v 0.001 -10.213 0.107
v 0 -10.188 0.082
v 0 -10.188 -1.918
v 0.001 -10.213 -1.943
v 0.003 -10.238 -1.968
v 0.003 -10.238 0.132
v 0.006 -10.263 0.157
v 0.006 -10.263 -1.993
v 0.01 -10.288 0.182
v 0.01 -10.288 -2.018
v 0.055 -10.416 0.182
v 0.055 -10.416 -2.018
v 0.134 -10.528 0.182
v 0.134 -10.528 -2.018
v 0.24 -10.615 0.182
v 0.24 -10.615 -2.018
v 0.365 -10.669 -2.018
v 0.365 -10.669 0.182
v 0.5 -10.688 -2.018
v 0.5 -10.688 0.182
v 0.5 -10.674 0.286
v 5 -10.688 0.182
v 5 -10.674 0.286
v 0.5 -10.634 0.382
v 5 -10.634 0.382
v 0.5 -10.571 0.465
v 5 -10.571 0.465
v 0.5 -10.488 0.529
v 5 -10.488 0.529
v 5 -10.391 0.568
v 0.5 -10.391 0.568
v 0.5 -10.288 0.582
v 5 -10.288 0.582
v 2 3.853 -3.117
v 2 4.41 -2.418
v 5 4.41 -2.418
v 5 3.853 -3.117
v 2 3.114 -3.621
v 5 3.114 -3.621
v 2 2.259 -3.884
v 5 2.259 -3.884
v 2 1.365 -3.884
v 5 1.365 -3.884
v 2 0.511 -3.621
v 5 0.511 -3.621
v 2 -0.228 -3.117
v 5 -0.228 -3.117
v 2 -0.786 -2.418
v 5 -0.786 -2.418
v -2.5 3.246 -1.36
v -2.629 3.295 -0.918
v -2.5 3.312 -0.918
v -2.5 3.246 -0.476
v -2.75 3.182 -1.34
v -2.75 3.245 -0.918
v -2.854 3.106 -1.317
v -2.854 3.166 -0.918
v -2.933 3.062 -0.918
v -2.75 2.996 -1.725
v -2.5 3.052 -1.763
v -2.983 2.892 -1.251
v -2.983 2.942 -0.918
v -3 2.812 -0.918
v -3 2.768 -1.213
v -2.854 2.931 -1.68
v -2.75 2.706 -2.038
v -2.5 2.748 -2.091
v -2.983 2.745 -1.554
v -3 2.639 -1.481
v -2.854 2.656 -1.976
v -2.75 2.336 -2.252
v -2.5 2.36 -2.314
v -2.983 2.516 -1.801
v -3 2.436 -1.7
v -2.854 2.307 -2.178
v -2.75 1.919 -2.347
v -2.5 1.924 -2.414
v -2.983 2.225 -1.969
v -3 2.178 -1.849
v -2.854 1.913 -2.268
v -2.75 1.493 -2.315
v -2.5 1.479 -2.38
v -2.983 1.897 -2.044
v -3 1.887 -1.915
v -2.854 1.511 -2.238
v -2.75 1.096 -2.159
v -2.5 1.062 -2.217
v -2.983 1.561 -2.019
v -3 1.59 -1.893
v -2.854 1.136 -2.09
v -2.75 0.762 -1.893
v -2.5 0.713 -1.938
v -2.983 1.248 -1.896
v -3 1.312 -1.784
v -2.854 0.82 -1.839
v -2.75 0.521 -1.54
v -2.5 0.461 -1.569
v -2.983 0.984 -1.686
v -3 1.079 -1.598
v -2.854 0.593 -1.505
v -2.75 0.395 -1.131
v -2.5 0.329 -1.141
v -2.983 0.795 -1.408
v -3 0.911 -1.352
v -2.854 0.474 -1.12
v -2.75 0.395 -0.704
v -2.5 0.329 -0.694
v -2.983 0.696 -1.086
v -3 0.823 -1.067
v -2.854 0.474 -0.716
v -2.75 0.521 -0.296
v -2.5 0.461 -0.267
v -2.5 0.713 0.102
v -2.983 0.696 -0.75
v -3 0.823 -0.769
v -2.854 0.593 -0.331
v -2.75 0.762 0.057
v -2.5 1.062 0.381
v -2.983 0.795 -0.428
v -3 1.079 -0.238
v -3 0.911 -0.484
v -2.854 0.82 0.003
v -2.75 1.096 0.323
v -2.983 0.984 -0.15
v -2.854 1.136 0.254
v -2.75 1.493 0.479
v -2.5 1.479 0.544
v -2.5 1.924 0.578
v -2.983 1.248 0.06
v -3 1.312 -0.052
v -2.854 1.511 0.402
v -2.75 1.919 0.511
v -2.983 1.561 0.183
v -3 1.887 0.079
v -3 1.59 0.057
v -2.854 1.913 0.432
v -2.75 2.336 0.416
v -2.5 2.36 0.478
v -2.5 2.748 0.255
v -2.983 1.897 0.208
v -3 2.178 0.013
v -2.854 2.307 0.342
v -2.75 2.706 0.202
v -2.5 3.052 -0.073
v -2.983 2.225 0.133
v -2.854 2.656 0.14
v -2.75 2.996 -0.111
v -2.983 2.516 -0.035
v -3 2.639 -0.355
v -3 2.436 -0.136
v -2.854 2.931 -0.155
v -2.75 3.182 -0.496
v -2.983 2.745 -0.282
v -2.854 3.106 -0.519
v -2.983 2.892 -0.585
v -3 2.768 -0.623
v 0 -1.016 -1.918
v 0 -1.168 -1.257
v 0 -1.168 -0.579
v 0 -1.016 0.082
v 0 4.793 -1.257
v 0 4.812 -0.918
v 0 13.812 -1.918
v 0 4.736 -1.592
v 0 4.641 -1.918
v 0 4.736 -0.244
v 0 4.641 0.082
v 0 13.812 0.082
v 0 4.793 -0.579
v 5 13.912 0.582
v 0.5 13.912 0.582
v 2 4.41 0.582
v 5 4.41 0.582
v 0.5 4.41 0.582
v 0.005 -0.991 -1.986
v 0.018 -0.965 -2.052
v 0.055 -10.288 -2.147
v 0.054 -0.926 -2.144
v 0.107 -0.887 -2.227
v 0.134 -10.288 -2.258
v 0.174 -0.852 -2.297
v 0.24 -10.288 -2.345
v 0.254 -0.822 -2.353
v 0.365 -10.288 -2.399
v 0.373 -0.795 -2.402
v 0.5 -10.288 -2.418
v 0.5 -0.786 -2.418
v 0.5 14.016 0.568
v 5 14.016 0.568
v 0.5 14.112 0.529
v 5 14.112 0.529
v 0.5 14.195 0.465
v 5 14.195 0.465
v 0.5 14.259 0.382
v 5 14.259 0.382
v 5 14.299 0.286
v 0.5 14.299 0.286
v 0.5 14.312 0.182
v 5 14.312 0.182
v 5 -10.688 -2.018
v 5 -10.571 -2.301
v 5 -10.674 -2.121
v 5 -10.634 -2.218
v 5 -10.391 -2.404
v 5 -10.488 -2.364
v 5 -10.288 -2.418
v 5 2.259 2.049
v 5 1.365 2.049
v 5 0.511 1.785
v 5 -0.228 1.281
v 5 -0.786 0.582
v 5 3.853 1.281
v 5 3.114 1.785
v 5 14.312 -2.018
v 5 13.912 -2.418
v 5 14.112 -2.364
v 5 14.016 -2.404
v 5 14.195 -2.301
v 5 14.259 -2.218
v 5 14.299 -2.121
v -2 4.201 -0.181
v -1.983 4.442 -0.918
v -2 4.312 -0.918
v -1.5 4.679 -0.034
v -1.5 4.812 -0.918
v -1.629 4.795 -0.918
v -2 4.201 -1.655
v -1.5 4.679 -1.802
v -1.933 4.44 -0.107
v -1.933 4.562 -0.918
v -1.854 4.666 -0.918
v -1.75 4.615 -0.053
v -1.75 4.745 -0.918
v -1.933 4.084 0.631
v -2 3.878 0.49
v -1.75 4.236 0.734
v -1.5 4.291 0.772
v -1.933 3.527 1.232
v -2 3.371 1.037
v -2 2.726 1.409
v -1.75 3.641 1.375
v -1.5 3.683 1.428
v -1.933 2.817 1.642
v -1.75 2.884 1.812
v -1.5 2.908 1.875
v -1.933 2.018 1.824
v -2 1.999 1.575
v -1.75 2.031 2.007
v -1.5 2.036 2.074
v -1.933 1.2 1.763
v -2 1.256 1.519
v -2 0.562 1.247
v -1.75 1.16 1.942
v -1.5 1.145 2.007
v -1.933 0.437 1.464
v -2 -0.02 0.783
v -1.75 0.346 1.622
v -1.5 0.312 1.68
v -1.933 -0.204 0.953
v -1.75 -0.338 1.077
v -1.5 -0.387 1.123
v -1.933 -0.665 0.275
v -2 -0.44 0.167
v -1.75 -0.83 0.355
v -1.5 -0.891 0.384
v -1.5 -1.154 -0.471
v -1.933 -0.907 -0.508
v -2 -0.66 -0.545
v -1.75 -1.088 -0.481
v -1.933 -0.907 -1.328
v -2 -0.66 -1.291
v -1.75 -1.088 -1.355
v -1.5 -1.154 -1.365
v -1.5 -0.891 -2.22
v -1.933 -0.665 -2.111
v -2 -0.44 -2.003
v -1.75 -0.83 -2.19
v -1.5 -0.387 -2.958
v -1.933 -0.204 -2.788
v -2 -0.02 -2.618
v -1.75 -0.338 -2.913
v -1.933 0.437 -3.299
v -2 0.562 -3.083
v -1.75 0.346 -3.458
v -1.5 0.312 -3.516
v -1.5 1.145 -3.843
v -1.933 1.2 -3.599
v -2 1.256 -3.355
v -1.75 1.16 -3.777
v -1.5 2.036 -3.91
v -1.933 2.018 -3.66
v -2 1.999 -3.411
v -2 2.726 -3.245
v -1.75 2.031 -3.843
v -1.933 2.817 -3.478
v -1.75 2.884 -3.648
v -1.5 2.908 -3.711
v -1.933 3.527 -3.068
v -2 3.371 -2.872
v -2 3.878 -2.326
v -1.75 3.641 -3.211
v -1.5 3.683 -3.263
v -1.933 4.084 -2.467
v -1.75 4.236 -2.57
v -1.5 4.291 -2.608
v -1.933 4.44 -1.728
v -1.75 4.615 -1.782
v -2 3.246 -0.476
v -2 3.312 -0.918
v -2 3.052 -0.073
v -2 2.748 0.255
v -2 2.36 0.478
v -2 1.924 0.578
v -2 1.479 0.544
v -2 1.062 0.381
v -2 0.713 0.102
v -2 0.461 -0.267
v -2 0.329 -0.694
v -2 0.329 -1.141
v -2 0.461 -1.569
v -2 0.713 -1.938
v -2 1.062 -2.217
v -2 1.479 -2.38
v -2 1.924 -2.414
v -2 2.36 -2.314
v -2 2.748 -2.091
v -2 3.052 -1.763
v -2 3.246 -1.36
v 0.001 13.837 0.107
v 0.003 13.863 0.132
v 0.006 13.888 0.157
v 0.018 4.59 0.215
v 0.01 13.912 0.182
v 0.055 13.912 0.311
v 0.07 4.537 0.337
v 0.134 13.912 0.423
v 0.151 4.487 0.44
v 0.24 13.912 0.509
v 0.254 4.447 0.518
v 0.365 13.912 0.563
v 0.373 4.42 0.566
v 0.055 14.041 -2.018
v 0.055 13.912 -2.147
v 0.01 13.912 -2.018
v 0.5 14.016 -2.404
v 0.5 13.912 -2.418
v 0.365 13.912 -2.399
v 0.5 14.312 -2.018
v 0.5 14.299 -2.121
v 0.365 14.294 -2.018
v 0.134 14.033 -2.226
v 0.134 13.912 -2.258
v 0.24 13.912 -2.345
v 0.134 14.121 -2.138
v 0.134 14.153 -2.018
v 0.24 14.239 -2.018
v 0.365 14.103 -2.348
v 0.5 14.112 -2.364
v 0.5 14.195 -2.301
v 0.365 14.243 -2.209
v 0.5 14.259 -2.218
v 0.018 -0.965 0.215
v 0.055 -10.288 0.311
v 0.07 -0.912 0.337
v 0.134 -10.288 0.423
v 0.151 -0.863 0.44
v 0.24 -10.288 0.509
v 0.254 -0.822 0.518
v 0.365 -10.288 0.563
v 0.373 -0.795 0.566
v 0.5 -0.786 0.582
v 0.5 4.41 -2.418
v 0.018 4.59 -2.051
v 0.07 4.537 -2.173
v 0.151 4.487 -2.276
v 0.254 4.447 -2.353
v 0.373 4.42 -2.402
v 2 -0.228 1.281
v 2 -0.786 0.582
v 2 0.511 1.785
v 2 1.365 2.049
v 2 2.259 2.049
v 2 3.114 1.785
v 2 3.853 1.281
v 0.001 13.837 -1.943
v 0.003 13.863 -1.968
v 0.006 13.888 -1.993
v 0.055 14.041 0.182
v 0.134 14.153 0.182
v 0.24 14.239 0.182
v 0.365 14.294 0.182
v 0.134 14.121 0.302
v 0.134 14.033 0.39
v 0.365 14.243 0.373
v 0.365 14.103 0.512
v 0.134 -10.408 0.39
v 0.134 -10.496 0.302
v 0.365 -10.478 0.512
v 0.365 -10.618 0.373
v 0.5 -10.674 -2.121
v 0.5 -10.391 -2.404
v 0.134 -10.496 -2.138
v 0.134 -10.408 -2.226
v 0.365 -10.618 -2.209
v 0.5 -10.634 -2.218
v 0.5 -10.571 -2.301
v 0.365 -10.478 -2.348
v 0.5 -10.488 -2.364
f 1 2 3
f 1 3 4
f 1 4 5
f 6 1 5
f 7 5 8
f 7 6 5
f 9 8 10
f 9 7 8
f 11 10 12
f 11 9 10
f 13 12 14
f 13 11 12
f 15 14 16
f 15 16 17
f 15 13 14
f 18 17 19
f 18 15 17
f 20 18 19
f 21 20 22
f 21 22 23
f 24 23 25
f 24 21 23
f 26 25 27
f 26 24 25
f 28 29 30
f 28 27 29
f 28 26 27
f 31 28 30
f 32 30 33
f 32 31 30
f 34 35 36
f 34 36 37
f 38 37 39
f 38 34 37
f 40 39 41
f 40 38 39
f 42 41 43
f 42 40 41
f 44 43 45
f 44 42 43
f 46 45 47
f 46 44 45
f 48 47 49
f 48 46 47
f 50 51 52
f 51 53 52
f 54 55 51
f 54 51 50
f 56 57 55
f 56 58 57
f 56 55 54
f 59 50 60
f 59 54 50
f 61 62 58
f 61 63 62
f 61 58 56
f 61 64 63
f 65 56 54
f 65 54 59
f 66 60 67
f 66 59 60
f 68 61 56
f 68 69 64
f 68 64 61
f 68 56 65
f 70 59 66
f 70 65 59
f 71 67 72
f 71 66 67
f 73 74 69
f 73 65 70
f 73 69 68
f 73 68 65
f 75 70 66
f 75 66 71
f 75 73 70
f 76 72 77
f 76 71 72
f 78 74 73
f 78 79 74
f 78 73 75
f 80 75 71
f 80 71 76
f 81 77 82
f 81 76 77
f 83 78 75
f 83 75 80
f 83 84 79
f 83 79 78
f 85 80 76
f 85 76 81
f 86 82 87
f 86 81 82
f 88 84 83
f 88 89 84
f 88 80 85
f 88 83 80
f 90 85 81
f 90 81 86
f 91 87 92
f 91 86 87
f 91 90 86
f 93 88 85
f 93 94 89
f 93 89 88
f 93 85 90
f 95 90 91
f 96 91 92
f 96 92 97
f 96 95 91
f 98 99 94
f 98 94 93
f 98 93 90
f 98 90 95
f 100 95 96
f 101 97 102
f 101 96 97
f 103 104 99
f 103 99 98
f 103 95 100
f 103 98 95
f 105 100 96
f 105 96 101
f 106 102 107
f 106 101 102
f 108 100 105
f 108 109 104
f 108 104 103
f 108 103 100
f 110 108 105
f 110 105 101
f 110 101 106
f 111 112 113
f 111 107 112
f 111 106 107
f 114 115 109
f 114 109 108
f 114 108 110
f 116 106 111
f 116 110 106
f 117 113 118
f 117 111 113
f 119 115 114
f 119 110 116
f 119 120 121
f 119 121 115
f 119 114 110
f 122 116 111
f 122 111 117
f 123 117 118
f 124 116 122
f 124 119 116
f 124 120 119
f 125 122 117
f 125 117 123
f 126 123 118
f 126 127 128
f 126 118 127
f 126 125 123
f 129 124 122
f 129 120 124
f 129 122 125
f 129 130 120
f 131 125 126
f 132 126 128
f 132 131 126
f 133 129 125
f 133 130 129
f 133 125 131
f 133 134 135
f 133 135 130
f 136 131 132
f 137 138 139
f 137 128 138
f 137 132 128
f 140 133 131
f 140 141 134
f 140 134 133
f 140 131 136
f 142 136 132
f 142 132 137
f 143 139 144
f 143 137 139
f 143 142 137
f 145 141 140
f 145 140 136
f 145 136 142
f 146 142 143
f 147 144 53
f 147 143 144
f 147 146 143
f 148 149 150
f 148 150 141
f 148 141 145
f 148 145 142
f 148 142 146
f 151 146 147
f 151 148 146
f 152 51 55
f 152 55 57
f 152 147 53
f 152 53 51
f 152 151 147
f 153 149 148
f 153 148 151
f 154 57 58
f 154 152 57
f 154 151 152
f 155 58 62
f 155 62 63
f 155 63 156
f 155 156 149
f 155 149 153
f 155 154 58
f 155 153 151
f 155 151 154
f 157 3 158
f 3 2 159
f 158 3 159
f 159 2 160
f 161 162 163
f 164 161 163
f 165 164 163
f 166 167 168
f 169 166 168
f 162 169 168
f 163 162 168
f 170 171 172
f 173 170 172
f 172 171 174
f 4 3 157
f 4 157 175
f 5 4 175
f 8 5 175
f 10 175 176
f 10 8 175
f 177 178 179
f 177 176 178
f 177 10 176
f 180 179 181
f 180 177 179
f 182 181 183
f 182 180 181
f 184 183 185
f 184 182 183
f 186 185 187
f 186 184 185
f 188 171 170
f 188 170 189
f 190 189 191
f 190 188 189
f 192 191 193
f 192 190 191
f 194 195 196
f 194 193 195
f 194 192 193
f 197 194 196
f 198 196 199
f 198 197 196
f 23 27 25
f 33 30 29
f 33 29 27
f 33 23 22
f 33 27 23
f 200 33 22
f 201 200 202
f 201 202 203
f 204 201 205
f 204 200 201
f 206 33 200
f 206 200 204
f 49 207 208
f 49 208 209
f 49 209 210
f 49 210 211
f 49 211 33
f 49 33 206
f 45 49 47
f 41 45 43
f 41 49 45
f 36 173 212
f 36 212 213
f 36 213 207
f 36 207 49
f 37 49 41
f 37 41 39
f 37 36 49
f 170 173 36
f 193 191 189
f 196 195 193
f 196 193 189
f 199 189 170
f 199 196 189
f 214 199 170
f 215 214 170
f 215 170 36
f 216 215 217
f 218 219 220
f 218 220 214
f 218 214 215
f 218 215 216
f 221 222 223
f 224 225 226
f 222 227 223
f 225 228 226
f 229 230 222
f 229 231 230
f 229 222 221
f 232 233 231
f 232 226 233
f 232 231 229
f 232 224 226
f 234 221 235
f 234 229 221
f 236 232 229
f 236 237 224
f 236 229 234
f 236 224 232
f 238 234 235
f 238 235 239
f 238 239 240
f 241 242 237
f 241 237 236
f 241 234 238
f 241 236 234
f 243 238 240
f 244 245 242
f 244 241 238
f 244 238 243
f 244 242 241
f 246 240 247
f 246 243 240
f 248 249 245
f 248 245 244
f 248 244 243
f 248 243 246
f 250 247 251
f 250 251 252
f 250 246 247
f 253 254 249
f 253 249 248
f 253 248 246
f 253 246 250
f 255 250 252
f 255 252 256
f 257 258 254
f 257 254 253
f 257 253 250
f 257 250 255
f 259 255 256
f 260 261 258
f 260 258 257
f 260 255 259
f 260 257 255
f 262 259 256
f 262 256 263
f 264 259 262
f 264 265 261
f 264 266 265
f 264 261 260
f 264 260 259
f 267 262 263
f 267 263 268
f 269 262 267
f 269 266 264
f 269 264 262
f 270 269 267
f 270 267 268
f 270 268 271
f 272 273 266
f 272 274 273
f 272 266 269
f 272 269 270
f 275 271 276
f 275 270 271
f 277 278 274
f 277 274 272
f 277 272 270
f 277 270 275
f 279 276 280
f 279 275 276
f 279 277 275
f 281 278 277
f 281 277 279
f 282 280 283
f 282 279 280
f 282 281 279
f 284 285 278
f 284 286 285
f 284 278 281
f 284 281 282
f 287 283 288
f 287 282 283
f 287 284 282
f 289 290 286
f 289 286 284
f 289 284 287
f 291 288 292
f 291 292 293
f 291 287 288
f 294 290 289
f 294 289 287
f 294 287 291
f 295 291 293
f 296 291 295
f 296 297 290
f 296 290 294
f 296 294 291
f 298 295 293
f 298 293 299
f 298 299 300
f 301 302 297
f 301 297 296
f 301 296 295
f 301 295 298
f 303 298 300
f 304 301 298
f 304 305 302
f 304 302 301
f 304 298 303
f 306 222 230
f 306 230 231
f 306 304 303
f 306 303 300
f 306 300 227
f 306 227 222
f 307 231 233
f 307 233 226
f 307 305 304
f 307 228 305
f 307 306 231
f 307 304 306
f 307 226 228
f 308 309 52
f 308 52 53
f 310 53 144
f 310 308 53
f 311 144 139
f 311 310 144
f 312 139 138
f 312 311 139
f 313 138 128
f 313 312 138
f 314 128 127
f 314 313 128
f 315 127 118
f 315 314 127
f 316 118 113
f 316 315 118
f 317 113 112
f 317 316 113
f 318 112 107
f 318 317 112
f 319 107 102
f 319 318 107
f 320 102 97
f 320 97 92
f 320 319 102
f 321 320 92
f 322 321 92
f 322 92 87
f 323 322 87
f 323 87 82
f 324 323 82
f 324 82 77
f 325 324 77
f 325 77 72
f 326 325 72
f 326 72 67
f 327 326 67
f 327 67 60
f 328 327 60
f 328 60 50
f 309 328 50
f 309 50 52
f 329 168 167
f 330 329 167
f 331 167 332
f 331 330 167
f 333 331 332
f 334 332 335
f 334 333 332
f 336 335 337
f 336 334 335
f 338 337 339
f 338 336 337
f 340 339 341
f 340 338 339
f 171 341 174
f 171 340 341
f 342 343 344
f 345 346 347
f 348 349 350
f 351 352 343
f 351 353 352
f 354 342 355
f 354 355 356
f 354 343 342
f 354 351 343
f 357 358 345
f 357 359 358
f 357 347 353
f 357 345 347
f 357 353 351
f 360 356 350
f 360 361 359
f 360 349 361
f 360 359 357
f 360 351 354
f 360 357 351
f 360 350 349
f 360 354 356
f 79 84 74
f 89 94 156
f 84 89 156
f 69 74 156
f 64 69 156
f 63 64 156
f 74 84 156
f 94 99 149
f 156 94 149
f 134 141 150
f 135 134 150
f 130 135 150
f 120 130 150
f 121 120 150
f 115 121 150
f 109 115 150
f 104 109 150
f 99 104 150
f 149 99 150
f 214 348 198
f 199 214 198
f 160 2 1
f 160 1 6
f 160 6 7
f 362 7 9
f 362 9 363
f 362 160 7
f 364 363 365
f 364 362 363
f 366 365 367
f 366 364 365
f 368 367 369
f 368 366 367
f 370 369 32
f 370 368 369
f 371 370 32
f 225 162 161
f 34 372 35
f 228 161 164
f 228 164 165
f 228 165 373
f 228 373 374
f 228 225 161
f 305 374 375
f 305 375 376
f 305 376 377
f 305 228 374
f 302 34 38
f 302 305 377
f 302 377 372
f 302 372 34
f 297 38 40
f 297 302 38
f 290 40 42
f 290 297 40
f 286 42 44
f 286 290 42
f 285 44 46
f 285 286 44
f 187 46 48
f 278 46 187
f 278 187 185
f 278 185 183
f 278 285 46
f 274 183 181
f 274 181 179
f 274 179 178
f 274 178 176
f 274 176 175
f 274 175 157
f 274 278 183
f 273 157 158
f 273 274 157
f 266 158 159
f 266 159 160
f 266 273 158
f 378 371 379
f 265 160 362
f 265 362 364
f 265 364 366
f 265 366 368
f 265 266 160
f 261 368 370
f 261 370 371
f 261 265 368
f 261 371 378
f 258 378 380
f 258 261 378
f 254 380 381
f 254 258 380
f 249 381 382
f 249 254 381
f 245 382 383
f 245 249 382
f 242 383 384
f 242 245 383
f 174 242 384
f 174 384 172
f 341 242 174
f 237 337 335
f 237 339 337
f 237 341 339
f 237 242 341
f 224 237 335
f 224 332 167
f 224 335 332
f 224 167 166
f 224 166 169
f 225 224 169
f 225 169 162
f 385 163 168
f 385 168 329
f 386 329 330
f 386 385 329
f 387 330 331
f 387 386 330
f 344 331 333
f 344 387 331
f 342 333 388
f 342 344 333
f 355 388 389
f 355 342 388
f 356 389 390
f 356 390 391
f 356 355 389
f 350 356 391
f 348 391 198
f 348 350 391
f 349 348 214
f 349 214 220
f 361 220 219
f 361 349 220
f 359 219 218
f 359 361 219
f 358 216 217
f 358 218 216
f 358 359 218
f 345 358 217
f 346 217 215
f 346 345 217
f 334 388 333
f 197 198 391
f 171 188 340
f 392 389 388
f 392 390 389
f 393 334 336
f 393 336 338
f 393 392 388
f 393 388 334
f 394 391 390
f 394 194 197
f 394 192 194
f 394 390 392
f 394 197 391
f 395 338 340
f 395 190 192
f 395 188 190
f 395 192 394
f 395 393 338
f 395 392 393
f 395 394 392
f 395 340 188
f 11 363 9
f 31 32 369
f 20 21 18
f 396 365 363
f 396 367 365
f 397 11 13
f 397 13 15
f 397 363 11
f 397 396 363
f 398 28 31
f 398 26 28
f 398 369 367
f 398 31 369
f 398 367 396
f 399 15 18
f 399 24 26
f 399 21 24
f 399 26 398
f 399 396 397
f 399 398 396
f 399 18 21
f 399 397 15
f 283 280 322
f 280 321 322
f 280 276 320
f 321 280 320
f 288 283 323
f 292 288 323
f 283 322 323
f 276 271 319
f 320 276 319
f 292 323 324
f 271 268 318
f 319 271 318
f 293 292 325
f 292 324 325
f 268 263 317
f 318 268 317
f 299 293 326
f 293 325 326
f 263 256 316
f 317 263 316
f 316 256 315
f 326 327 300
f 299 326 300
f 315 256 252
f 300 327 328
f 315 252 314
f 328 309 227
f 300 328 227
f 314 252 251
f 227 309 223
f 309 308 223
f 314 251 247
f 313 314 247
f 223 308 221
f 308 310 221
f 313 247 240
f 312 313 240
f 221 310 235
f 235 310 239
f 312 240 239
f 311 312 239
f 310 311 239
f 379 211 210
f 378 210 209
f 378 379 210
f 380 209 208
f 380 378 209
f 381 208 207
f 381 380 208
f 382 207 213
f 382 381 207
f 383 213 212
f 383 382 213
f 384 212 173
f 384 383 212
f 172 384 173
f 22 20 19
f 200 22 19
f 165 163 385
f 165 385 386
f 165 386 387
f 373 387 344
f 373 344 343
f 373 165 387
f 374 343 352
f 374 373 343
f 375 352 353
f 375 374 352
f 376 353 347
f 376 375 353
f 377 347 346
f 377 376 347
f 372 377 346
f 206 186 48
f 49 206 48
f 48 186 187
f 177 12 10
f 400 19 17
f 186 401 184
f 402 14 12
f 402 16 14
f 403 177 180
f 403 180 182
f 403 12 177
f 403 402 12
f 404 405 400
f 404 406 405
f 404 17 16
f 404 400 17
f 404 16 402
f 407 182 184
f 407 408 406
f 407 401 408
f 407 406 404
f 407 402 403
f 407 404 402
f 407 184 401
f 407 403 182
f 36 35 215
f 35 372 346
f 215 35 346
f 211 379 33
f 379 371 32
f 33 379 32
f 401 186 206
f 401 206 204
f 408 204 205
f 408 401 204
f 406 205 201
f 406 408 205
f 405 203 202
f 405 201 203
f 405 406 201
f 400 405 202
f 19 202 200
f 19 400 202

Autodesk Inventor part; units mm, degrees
ref_plane "YZ Plane" through (0, 0, 0) normal (1, 0, 0) x (0, 1, 0)
ref_plane "XZ Plane" through (0, 0, 0) normal (0, 1, 0) x (-1, 0, 0)
ref_plane "XY Plane" through (0, 0, 0) normal (0, 0, 1) x (1, 0, 0)
sketch "Sketch1" plane through (0, 0, 0) normal (1, 0, 0) x (0, 1, 0)
  line L0 (13.9123, 0.5821) -> (-10.2877, 0.5821)
  line L1 (-10.6877, 0.1821) -> (-10.6877, -2.0179)
  line L2 (-10.2877, -2.4179) -> (13.9123, -2.4179)
  line L3 (14.3123, -2.0179) -> (14.3123, 0.1821)
  arc A0 (13.9123, -2.4179) -> (14.3123, -2.0179) centre (13.9123, -2.0179) ccw
  arc A1 (14.3123, 0.1821) -> (13.9123, 0.5821) centre (13.9123, 0.1821) ccw
  arc A2 (-10.6877, -2.0179) -> (-10.2877, -2.4179) centre (-10.2877, -2.0179) ccw
  arc A3 (-10.2877, 0.5821) -> (-10.6877, 0.1821) centre (-10.2877, 0.1821) ccw
  line L4 (14.3123, -4.8123) -> (1.8123, -4.8123) construction
  line L5 (14.3123, 0.1821) -> (14.3123, -23.1695) construction
  circle A4 centre (1.8123, -0.9179) radius 3
  circle A5 centre (1.8123, -0.9179) radius 1.5
  point P0 (0, 0)
  point P1 (-10.6877, -2.4179)
  point P2 (-10.6877, 0.5821)
  point P3 (14.3123, -2.4179)
  point P4 (4.4103, 0.5821)
  point P5 (-0.7858, 0.5821)
  point P6 (-0.7858, -2.4179)
  point P7 (4.4103, -2.4179)
  dimension "d1" = 3
  dimension "d2" = 25
  dimension "d3" = 0.4
  dimension "d4" = 12.5
  dimension "d5" = 6
extrude "Extrusion1" add sketch "Sketch1" along normal blind 2
extrude "Extrusion2" add sketch "Sketch1" against normal blind 2 contours A4 L2 A5 L0 | L0 A4 | A5 L2 A4 L0 | A5 | L2 A4
extrude "Extrusion3" add sketch "Sketch1" against normal blind 3 contours A5
fillet "Fillet1" radius 0.5 1 edges at (-3, 0.3123, -0.9179)
fillet "Fillet2" radius 0.5 1 edges at (-2, -1.1877, -0.9179)
fillet "Fillet3" radius 0.5 10 edges at (0, 14.1951, 0.465) (0, 14.3123, -0.9179) (0, 14.1951, -2.3007) (0, 9.1613, -2.4179) (0, 9.1613, 0.5821) (0, -10.5706, 0.465) (0, -10.6877, -0.9179) (0, -10.5706, -2.3007) (0, -5.5368, -2.4179) (0, -5.5368, 0.5821)
sketch "Sketch2" plane through (2, 0, 0) normal (1, 0, 0) x (0, 0, -1)
  line L0 (-0.5821, 13.9123) -> (-0.5821, 4.4103) projected
  arc A0 (-0.5821, 4.4103) -> (-0.5821, -0.7858) centre (0.9179, 1.8123) ccw projected
  line L1 (-0.5821, -0.7858) -> (-0.5821, -10.2877) projected
  arc A1 (-0.5821, -10.2877) -> (-0.1821, -10.6877) centre (-0.1821, -10.2877) ccw projected
  line L2 (-0.1821, -10.6877) -> (2.0179, -10.6877) projected
  arc A2 (2.0179, -10.6877) -> (2.4179, -10.2877) centre (2.0179, -10.2877) ccw projected
  line L3 (2.4179, -10.2877) -> (2.4179, -0.7858) projected
  arc A3 (2.4179, -0.7858) -> (2.4179, 4.4103) centre (0.9179, 1.8123) ccw projected
  line L4 (2.4179, 4.4103) -> (2.4179, 13.9123) projected
  arc A4 (2.4179, 13.9123) -> (2.0179, 14.3123) centre (2.0179, 13.9123) ccw projected
  line L5 (2.0179, 14.3123) -> (-0.1821, 14.3123) projected
  arc A5 (-0.1821, 14.3123) -> (-0.5821, 13.9123) centre (-0.1821, 13.9123) ccw projected
  point P0 (0, 0)
extrude "Extrusion4" add sketch "Sketch2" along normal blind 3
properties part number "torque"
